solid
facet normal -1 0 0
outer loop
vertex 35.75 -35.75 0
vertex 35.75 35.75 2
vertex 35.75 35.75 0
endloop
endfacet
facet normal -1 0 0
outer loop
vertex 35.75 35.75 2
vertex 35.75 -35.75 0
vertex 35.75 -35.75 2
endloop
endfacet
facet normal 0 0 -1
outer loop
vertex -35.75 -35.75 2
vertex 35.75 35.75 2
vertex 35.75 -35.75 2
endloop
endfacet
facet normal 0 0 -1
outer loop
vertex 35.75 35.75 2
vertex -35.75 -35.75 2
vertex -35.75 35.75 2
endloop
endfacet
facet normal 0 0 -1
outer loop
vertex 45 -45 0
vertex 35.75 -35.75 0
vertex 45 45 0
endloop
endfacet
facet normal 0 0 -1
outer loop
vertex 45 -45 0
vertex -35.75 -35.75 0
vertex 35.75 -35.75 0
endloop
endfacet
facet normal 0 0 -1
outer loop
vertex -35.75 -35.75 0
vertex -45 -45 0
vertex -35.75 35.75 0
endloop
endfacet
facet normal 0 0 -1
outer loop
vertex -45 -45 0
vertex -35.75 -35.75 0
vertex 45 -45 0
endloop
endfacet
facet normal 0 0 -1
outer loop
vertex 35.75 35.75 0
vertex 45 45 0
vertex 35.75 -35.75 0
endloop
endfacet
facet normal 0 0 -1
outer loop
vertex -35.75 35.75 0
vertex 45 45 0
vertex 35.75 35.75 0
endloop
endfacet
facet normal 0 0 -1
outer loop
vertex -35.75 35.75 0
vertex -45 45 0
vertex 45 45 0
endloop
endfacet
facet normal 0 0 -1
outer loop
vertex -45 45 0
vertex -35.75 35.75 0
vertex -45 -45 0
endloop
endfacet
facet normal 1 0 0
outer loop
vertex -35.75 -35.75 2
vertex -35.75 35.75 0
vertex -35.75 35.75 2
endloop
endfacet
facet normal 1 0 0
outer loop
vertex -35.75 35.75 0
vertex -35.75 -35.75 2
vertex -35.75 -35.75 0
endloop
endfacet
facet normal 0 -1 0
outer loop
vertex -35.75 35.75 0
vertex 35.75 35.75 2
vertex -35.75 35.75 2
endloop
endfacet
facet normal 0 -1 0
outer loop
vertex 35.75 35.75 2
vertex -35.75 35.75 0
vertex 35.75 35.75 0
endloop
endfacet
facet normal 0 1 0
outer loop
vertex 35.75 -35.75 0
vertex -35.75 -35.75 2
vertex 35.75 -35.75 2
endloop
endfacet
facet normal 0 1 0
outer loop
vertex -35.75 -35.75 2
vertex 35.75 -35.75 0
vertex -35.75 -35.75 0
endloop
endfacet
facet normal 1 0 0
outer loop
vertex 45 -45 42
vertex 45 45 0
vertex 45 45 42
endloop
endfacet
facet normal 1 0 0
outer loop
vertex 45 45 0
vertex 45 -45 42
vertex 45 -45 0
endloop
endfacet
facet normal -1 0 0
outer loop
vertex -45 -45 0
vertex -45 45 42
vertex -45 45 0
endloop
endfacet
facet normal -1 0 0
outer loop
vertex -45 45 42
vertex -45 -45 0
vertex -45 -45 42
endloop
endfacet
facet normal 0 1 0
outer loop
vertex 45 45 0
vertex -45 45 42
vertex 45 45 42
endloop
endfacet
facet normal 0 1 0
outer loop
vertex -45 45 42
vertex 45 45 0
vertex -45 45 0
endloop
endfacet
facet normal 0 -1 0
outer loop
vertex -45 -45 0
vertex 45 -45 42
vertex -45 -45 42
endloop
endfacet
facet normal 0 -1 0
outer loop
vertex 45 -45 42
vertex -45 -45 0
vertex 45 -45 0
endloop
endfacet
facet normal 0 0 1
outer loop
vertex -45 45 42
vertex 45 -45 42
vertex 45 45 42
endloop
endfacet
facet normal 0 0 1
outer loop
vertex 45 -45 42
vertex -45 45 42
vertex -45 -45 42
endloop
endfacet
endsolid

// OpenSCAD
// Built by bench/smallmodels/features/compiler.py from a list of features.
$fn = 64;
difference() {
  union() {
    translate([0, 0, 0]) translate([-45, -45, 0]) cube([90, 90, 2]);
  }
  union() {
    translate([0, 0, 0]) rotate([0, 0, 0]) translate([-35.75, -35.75, 0]) cube([71.5, 71.5, 2]);
    translate([0, -177.5, 2]) rotate([0, 0, 0]) translate([-45, -1.25, 0]) cube([90, 2.5, 38]);
    translate([0, -87.5, 2]) rotate([0, 0, 0]) translate([-45, -1.25, 0]) cube([90, 2.5, 38]);
    translate([0, 2.5, 2]) rotate([0, 0, 0]) translate([-45, -1.25, 0]) cube([90, 2.5, 38]);
    translate([0, 92.5, 2]) rotate([0, 0, 0]) translate([-45, -1.25, 0]) cube([90, 2.5, 38]);
    translate([-177.5, 0, 2]) rotate([0, 0, 0]) translate([-1.25, -45, 0]) cube([2.5, 90, 38]);
    translate([-87.5, 0, 2]) rotate([0, 0, 0]) translate([-1.25, -45, 0]) cube([2.5, 90, 38]);
    translate([2.5, 0, 2]) rotate([0, 0, 0]) translate([-1.25, -45, 0]) cube([2.5, 90, 38]);
    translate([92.5, 0, 2]) rotate([0, 0, 0]) translate([-1.25, -45, 0]) cube([2.5, 90, 38]);
    translate([0, -177.5, 2]) rotate([0, 0, 0]) translate([-1.25, -45, 0]) cube([2.5, 90, 38]);
    translate([0, -87.5, 2]) rotate([0, 0, 0]) translate([-1.25, -45, 0]) cube([2.5, 90, 38]);
    translate([0, 2.5, 2]) rotate([0, 0, 0]) translate([-1.25, -45, 0]) cube([2.5, 90, 38]);
    translate([0, 92.5, 2]) rotate([0, 0, 0]) translate([-1.25, -45, 0]) cube([2.5, 90, 38]);
    translate([0, -92.5, 2]) rotate([0, 0, 0]) translate([-1.25, -45, 0]) cube([2.5, 90, 38]);
    translate([0, -2.5, 2]) rotate([0, 0, 0]) translate([-1.25, -45, 0]) cube([2.5, 90, 38]);
    translate([0, 87.5, 2]) rotate([0, 0, 0]) translate([-1.25, -45, 0]) cube([2.5, 90, 38]);
    translate([0, 177.5, 2]) rotate([0, 0, 0]) translate([-1.25, -45, 0]) cube([2.5, 90, 38]);
  }
}
union() {
    translate([0, 0, 2]) translate([-45, -45, 0]) cube([90, 90, 40]);
  }
